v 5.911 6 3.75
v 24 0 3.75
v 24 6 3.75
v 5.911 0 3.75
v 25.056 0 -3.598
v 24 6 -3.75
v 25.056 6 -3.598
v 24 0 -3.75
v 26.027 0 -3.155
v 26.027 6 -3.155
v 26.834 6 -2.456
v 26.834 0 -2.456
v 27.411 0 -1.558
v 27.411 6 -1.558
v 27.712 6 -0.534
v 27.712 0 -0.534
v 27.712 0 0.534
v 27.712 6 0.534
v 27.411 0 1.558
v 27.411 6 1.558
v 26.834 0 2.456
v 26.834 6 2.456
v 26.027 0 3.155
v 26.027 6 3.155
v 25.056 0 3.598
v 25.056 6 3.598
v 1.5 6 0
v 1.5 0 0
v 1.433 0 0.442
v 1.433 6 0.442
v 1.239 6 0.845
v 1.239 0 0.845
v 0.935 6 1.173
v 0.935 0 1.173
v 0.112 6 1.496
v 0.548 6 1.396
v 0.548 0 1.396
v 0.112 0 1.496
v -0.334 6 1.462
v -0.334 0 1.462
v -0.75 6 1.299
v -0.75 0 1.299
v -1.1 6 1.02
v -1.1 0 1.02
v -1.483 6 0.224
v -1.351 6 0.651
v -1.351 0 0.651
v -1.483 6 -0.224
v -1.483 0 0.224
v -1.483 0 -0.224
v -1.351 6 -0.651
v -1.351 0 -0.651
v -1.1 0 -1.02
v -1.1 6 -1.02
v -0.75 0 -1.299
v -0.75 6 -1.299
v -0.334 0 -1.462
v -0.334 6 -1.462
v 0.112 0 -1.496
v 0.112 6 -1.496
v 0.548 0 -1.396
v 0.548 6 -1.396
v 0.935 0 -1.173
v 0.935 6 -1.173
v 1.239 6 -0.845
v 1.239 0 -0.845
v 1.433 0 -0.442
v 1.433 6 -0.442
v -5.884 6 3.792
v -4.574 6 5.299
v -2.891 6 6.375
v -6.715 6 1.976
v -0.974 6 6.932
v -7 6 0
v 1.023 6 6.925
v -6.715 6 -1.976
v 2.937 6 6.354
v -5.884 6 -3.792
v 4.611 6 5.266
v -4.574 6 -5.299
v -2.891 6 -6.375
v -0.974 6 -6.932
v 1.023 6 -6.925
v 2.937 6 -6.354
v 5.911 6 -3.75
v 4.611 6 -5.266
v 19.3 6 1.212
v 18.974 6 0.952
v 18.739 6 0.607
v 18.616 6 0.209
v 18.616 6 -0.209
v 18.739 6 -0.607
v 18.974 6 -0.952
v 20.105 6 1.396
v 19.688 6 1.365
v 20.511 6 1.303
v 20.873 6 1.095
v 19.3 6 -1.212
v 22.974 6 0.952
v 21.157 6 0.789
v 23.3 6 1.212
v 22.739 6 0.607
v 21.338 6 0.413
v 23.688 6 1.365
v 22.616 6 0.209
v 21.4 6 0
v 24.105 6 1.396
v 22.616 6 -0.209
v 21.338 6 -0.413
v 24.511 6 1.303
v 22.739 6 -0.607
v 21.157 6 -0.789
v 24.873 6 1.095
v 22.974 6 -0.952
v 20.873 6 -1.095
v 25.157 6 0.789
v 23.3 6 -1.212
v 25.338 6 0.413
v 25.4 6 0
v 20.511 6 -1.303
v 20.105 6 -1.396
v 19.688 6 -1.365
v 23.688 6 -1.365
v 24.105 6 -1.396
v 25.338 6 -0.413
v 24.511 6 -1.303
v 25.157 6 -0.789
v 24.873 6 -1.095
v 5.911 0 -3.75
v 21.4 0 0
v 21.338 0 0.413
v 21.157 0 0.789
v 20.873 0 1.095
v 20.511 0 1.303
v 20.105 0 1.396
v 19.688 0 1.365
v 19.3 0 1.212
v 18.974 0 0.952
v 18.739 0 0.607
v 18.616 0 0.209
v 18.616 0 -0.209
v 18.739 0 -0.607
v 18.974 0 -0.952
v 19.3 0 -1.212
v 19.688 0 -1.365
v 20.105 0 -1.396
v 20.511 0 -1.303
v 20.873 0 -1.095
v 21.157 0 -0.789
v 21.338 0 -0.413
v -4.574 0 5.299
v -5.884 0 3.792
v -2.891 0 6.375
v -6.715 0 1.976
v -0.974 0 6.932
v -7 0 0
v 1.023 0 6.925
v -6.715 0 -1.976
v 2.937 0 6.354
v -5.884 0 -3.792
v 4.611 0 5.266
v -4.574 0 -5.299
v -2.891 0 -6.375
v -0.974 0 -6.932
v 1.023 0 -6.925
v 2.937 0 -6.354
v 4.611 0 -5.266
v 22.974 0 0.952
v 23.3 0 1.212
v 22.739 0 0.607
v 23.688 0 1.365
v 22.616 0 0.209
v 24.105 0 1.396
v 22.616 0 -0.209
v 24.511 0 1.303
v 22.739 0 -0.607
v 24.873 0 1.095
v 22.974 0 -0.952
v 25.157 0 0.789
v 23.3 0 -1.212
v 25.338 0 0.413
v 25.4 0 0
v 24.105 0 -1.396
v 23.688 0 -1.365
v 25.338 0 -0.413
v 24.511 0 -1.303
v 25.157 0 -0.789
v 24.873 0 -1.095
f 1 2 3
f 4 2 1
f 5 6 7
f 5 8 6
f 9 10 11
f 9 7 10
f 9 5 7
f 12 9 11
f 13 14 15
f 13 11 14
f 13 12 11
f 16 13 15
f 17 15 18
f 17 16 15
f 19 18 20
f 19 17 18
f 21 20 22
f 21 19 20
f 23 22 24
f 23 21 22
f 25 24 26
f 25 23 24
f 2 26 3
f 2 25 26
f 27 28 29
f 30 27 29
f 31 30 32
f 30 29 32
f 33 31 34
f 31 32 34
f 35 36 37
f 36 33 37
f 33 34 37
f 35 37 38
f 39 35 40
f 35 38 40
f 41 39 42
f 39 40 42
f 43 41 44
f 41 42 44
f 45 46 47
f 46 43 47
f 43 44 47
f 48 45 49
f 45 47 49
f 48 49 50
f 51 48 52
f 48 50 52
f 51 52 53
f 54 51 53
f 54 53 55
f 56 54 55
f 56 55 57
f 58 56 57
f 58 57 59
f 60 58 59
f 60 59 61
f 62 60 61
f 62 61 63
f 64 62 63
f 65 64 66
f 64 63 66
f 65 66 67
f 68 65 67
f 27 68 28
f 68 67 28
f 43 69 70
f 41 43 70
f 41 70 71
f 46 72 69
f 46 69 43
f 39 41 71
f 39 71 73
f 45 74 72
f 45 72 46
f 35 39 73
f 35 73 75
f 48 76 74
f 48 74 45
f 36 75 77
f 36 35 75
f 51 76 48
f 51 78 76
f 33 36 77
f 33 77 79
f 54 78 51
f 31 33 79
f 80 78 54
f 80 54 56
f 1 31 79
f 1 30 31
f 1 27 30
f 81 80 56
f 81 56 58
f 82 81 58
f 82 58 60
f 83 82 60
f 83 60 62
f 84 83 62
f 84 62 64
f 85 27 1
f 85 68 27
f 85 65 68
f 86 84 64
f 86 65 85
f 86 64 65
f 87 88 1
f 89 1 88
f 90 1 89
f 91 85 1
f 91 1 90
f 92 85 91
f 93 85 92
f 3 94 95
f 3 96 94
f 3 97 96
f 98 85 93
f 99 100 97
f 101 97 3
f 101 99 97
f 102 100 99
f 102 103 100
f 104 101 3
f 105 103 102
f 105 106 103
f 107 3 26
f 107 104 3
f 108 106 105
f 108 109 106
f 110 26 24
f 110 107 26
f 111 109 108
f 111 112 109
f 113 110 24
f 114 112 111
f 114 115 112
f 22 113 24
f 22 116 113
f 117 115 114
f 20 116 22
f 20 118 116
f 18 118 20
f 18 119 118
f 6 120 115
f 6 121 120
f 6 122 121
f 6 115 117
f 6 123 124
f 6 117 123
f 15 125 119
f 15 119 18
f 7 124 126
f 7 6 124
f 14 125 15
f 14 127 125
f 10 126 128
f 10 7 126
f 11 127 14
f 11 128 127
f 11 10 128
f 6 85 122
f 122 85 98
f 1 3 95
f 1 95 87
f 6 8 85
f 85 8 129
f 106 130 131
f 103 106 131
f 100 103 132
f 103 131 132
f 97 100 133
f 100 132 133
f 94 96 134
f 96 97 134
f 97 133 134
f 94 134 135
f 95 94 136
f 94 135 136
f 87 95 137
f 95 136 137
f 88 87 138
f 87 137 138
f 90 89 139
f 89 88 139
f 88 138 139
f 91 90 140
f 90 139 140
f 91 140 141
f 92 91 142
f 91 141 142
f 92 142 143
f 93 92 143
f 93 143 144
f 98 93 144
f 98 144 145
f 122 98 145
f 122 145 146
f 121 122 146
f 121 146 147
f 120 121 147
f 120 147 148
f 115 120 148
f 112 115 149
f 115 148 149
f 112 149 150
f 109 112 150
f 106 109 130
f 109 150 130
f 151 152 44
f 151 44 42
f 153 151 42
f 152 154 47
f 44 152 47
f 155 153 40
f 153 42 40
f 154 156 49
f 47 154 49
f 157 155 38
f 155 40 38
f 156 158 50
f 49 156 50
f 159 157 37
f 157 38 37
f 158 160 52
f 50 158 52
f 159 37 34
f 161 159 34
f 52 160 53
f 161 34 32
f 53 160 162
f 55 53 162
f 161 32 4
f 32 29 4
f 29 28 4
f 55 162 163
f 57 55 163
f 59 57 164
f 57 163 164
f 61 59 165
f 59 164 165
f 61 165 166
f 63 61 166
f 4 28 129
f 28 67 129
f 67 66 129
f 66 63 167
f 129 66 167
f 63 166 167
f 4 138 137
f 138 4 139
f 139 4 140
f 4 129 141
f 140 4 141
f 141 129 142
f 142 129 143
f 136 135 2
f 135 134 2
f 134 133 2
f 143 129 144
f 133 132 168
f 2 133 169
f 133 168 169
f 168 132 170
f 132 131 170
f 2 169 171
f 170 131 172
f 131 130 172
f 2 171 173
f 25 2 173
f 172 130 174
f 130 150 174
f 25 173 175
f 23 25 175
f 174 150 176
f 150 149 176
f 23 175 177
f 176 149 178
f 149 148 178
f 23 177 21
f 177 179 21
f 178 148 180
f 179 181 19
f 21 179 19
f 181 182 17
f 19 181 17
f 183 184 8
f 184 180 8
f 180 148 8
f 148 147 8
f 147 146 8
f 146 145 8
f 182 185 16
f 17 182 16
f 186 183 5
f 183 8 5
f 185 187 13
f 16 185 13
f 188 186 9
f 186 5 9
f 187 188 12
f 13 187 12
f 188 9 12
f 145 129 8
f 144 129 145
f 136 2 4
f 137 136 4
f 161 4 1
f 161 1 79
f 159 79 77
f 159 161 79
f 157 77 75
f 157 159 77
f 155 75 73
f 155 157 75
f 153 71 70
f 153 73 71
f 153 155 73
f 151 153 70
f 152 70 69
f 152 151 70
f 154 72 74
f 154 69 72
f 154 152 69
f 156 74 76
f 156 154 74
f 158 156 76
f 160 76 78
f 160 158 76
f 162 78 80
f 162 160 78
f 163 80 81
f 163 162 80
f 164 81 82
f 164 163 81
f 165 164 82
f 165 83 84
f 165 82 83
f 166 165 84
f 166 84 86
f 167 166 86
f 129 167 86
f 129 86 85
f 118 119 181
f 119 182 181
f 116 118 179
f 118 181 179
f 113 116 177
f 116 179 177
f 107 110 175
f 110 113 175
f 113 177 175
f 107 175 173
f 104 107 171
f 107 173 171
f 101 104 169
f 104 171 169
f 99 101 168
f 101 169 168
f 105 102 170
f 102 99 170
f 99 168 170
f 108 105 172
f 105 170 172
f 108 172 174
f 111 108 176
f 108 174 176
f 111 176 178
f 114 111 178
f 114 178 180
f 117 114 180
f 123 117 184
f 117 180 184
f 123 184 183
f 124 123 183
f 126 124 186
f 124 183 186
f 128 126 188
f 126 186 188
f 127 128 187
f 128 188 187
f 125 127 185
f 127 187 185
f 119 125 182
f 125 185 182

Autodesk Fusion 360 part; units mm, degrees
sketch "Skizze1" plane through (0, 0, 0) normal (0, 1, 0) x (1, 0, 0)
  circle A0 centre (0, 0) radius 1.5
  circle A1 centre (20, 0) radius 1.4
  circle A2 centre (24, 0) radius 1.4
  line L0 (0, 0) -> (24, 0) construction
  line L1 (24, 3.75) -> (5.9108, 3.75)
  line L2 (24, -3.75) -> (5.9108, -3.75)
  arc A3 (24, -3.75) -> (24, 3.75) centre (24, 0) ccw
  arc A4 (5.9108, 3.75) -> (5.9108, -3.75) centre (0, 0) ccw
  dimension "d1" = 3
  dimension "d2" = 2.8
  dimension "d3" = 2.8
  dimension "d4" = 20
  dimension "d5" = 4
  dimension "d6" = 14
  dimension "d7" = 7.5
extrude "Extrusion1" add sketch "Skizze1" along normal blind 6
